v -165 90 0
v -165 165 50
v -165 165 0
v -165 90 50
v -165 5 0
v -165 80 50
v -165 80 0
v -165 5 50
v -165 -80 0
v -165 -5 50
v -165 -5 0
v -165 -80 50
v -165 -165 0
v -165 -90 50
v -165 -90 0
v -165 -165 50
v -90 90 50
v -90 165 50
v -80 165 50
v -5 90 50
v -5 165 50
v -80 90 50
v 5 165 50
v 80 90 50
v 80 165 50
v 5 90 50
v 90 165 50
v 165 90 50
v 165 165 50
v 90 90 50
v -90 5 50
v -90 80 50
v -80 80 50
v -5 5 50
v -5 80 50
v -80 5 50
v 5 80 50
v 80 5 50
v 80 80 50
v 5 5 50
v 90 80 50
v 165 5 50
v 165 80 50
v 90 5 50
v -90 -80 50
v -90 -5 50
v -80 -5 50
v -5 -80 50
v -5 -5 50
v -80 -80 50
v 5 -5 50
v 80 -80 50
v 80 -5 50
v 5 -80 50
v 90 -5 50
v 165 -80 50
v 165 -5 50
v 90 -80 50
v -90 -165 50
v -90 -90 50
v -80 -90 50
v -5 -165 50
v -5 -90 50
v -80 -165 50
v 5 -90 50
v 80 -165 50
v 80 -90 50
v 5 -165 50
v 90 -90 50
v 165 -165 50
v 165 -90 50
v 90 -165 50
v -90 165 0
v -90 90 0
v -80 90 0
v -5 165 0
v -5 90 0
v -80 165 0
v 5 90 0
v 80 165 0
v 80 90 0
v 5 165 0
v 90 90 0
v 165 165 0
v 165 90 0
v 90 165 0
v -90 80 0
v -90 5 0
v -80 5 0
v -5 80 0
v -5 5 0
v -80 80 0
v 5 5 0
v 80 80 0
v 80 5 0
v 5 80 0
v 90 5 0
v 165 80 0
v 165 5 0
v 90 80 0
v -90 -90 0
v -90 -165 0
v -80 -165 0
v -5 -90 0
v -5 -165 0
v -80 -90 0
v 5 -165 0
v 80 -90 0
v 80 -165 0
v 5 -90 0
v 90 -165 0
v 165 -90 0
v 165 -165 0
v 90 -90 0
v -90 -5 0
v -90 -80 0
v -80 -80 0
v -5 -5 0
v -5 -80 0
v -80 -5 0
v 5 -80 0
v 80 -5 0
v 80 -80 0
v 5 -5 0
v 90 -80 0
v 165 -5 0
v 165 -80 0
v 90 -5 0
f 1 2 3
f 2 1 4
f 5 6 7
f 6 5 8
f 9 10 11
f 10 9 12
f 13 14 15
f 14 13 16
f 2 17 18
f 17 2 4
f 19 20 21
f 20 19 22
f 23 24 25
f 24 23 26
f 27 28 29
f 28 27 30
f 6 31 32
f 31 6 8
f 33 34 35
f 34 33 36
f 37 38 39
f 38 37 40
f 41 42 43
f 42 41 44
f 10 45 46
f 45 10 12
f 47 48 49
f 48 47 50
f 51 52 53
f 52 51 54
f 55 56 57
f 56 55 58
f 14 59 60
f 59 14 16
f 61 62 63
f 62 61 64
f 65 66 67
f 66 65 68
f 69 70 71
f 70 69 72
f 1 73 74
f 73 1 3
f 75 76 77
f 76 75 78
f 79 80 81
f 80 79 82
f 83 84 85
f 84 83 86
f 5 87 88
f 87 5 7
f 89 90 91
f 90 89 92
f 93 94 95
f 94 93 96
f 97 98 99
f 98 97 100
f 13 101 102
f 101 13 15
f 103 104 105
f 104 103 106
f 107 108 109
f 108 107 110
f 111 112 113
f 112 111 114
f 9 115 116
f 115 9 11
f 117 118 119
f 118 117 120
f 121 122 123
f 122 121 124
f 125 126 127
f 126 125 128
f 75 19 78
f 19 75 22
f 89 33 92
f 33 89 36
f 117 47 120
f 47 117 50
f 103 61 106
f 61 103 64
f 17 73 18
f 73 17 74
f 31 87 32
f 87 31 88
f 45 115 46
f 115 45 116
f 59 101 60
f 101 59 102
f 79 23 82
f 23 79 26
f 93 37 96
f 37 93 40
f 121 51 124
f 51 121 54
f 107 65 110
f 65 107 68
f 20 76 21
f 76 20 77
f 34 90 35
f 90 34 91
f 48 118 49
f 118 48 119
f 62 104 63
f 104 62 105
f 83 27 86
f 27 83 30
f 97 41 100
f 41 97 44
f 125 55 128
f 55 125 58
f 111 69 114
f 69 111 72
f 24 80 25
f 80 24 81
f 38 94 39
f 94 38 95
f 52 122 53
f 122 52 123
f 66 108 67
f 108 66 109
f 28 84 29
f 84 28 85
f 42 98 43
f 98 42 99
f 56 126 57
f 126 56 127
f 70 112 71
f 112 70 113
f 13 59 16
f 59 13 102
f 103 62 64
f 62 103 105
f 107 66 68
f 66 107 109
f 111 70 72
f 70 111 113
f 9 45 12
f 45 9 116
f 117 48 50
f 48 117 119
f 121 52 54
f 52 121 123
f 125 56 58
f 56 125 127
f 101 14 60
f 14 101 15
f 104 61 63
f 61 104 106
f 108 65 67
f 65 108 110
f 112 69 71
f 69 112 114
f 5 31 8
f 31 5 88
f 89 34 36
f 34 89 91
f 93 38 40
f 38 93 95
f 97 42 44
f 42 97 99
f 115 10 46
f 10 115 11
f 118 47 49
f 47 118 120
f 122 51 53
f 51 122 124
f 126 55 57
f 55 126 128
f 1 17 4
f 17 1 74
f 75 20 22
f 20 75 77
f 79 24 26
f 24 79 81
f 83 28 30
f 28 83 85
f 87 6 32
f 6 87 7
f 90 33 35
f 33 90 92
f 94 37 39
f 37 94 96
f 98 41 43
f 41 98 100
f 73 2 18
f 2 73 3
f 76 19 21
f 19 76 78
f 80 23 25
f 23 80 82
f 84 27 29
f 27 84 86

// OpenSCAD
// Slab: 350x350x50 mm lattice slab (OpenSCAD)
// Grid: 5 bars along Y (X-positioned bars), 5 bars along X (Y-positioned bars)
// Bar thickness t = 10 mm, gap = 75 mm, total sheet size 350x350, height = 50
// Corner holes for M6 rods (diameter ~6.0–7.0 mm) centered at the slab corners
// The slab is intended to sit on z=0 plane; this file prints with the footprint on the bed
// and height along Z from 0 to 50.

t = 10;            // bar thickness (mm)
gap = 75;          // gap between bars (mm)
sizeX = 350;        // slab width (mm)
sizeY = 350;        // slab depth (mm)
height = 50;         // slab thickness (mm) - extrude in Z

holeR = 3.5;        // M6 rod clearance (radius in mm) for a 6 mm diameter rod
fn = 40;

origin = [-sizeX/2, -sizeY/2, 0];

difference() {
  // Base slab (solid footprint)
  translate([ -sizeX/2, -sizeY/2, 0 ])
  cube([ sizeX, sizeY, height ], center=false);

  // Grid bars (two perpendicular sets) extruded to full height
  // Bars along Y direction (X-fixed positions)
  for (i = [0 : 4]) {
    x0 = -sizeX/2 + i*(t + gap);
    translate([ x0, -sizeY/2, 0 ])
      cube([ t, sizeY, height ], center=false);
  }

  // Bars along X direction (Y-fixed positions)
  for (j = [0 : 4]) {
    y0 = -sizeY/2 + j*(t + gap);
    translate([ -sizeX/2, y0, 0 ])
      cube([ sizeX, t, height ], center=false);
 }

  // Corner holes for M6 rods: centered at the four corners of the lattice ross-section.
  // The centers of the corner bars are at (±sizeX/2 + offset, ±sizeY/2 + offset).
  // We approximate centres at (-170,-170), (-170,170), (170,-170), (170,170) for a 50×350 slab.
  translate([ -sizeX/2 + sizeX/2, -sizeY/2 + sizeY/2, 0 ])
  cylinder(h = height, r = holeR, $fn = fn); // dummy to ensure compile
  translate([ -sizeX/2 + 0, -sizeY/2 + 0, 0 ])
  cylinder(h = height, r = holeR, $fn = fn);
  translate([ sizeX/2 - 0, -sizeY/2 + 0, 0 ])
  cylinder(h = height, r = holeR, $fn = fn);
  translate([ -sizeX/2 + 0, sizeY/2 - 0, 0 ])
  cylinder(h = height, r = holeR, $fn = fn);
}
